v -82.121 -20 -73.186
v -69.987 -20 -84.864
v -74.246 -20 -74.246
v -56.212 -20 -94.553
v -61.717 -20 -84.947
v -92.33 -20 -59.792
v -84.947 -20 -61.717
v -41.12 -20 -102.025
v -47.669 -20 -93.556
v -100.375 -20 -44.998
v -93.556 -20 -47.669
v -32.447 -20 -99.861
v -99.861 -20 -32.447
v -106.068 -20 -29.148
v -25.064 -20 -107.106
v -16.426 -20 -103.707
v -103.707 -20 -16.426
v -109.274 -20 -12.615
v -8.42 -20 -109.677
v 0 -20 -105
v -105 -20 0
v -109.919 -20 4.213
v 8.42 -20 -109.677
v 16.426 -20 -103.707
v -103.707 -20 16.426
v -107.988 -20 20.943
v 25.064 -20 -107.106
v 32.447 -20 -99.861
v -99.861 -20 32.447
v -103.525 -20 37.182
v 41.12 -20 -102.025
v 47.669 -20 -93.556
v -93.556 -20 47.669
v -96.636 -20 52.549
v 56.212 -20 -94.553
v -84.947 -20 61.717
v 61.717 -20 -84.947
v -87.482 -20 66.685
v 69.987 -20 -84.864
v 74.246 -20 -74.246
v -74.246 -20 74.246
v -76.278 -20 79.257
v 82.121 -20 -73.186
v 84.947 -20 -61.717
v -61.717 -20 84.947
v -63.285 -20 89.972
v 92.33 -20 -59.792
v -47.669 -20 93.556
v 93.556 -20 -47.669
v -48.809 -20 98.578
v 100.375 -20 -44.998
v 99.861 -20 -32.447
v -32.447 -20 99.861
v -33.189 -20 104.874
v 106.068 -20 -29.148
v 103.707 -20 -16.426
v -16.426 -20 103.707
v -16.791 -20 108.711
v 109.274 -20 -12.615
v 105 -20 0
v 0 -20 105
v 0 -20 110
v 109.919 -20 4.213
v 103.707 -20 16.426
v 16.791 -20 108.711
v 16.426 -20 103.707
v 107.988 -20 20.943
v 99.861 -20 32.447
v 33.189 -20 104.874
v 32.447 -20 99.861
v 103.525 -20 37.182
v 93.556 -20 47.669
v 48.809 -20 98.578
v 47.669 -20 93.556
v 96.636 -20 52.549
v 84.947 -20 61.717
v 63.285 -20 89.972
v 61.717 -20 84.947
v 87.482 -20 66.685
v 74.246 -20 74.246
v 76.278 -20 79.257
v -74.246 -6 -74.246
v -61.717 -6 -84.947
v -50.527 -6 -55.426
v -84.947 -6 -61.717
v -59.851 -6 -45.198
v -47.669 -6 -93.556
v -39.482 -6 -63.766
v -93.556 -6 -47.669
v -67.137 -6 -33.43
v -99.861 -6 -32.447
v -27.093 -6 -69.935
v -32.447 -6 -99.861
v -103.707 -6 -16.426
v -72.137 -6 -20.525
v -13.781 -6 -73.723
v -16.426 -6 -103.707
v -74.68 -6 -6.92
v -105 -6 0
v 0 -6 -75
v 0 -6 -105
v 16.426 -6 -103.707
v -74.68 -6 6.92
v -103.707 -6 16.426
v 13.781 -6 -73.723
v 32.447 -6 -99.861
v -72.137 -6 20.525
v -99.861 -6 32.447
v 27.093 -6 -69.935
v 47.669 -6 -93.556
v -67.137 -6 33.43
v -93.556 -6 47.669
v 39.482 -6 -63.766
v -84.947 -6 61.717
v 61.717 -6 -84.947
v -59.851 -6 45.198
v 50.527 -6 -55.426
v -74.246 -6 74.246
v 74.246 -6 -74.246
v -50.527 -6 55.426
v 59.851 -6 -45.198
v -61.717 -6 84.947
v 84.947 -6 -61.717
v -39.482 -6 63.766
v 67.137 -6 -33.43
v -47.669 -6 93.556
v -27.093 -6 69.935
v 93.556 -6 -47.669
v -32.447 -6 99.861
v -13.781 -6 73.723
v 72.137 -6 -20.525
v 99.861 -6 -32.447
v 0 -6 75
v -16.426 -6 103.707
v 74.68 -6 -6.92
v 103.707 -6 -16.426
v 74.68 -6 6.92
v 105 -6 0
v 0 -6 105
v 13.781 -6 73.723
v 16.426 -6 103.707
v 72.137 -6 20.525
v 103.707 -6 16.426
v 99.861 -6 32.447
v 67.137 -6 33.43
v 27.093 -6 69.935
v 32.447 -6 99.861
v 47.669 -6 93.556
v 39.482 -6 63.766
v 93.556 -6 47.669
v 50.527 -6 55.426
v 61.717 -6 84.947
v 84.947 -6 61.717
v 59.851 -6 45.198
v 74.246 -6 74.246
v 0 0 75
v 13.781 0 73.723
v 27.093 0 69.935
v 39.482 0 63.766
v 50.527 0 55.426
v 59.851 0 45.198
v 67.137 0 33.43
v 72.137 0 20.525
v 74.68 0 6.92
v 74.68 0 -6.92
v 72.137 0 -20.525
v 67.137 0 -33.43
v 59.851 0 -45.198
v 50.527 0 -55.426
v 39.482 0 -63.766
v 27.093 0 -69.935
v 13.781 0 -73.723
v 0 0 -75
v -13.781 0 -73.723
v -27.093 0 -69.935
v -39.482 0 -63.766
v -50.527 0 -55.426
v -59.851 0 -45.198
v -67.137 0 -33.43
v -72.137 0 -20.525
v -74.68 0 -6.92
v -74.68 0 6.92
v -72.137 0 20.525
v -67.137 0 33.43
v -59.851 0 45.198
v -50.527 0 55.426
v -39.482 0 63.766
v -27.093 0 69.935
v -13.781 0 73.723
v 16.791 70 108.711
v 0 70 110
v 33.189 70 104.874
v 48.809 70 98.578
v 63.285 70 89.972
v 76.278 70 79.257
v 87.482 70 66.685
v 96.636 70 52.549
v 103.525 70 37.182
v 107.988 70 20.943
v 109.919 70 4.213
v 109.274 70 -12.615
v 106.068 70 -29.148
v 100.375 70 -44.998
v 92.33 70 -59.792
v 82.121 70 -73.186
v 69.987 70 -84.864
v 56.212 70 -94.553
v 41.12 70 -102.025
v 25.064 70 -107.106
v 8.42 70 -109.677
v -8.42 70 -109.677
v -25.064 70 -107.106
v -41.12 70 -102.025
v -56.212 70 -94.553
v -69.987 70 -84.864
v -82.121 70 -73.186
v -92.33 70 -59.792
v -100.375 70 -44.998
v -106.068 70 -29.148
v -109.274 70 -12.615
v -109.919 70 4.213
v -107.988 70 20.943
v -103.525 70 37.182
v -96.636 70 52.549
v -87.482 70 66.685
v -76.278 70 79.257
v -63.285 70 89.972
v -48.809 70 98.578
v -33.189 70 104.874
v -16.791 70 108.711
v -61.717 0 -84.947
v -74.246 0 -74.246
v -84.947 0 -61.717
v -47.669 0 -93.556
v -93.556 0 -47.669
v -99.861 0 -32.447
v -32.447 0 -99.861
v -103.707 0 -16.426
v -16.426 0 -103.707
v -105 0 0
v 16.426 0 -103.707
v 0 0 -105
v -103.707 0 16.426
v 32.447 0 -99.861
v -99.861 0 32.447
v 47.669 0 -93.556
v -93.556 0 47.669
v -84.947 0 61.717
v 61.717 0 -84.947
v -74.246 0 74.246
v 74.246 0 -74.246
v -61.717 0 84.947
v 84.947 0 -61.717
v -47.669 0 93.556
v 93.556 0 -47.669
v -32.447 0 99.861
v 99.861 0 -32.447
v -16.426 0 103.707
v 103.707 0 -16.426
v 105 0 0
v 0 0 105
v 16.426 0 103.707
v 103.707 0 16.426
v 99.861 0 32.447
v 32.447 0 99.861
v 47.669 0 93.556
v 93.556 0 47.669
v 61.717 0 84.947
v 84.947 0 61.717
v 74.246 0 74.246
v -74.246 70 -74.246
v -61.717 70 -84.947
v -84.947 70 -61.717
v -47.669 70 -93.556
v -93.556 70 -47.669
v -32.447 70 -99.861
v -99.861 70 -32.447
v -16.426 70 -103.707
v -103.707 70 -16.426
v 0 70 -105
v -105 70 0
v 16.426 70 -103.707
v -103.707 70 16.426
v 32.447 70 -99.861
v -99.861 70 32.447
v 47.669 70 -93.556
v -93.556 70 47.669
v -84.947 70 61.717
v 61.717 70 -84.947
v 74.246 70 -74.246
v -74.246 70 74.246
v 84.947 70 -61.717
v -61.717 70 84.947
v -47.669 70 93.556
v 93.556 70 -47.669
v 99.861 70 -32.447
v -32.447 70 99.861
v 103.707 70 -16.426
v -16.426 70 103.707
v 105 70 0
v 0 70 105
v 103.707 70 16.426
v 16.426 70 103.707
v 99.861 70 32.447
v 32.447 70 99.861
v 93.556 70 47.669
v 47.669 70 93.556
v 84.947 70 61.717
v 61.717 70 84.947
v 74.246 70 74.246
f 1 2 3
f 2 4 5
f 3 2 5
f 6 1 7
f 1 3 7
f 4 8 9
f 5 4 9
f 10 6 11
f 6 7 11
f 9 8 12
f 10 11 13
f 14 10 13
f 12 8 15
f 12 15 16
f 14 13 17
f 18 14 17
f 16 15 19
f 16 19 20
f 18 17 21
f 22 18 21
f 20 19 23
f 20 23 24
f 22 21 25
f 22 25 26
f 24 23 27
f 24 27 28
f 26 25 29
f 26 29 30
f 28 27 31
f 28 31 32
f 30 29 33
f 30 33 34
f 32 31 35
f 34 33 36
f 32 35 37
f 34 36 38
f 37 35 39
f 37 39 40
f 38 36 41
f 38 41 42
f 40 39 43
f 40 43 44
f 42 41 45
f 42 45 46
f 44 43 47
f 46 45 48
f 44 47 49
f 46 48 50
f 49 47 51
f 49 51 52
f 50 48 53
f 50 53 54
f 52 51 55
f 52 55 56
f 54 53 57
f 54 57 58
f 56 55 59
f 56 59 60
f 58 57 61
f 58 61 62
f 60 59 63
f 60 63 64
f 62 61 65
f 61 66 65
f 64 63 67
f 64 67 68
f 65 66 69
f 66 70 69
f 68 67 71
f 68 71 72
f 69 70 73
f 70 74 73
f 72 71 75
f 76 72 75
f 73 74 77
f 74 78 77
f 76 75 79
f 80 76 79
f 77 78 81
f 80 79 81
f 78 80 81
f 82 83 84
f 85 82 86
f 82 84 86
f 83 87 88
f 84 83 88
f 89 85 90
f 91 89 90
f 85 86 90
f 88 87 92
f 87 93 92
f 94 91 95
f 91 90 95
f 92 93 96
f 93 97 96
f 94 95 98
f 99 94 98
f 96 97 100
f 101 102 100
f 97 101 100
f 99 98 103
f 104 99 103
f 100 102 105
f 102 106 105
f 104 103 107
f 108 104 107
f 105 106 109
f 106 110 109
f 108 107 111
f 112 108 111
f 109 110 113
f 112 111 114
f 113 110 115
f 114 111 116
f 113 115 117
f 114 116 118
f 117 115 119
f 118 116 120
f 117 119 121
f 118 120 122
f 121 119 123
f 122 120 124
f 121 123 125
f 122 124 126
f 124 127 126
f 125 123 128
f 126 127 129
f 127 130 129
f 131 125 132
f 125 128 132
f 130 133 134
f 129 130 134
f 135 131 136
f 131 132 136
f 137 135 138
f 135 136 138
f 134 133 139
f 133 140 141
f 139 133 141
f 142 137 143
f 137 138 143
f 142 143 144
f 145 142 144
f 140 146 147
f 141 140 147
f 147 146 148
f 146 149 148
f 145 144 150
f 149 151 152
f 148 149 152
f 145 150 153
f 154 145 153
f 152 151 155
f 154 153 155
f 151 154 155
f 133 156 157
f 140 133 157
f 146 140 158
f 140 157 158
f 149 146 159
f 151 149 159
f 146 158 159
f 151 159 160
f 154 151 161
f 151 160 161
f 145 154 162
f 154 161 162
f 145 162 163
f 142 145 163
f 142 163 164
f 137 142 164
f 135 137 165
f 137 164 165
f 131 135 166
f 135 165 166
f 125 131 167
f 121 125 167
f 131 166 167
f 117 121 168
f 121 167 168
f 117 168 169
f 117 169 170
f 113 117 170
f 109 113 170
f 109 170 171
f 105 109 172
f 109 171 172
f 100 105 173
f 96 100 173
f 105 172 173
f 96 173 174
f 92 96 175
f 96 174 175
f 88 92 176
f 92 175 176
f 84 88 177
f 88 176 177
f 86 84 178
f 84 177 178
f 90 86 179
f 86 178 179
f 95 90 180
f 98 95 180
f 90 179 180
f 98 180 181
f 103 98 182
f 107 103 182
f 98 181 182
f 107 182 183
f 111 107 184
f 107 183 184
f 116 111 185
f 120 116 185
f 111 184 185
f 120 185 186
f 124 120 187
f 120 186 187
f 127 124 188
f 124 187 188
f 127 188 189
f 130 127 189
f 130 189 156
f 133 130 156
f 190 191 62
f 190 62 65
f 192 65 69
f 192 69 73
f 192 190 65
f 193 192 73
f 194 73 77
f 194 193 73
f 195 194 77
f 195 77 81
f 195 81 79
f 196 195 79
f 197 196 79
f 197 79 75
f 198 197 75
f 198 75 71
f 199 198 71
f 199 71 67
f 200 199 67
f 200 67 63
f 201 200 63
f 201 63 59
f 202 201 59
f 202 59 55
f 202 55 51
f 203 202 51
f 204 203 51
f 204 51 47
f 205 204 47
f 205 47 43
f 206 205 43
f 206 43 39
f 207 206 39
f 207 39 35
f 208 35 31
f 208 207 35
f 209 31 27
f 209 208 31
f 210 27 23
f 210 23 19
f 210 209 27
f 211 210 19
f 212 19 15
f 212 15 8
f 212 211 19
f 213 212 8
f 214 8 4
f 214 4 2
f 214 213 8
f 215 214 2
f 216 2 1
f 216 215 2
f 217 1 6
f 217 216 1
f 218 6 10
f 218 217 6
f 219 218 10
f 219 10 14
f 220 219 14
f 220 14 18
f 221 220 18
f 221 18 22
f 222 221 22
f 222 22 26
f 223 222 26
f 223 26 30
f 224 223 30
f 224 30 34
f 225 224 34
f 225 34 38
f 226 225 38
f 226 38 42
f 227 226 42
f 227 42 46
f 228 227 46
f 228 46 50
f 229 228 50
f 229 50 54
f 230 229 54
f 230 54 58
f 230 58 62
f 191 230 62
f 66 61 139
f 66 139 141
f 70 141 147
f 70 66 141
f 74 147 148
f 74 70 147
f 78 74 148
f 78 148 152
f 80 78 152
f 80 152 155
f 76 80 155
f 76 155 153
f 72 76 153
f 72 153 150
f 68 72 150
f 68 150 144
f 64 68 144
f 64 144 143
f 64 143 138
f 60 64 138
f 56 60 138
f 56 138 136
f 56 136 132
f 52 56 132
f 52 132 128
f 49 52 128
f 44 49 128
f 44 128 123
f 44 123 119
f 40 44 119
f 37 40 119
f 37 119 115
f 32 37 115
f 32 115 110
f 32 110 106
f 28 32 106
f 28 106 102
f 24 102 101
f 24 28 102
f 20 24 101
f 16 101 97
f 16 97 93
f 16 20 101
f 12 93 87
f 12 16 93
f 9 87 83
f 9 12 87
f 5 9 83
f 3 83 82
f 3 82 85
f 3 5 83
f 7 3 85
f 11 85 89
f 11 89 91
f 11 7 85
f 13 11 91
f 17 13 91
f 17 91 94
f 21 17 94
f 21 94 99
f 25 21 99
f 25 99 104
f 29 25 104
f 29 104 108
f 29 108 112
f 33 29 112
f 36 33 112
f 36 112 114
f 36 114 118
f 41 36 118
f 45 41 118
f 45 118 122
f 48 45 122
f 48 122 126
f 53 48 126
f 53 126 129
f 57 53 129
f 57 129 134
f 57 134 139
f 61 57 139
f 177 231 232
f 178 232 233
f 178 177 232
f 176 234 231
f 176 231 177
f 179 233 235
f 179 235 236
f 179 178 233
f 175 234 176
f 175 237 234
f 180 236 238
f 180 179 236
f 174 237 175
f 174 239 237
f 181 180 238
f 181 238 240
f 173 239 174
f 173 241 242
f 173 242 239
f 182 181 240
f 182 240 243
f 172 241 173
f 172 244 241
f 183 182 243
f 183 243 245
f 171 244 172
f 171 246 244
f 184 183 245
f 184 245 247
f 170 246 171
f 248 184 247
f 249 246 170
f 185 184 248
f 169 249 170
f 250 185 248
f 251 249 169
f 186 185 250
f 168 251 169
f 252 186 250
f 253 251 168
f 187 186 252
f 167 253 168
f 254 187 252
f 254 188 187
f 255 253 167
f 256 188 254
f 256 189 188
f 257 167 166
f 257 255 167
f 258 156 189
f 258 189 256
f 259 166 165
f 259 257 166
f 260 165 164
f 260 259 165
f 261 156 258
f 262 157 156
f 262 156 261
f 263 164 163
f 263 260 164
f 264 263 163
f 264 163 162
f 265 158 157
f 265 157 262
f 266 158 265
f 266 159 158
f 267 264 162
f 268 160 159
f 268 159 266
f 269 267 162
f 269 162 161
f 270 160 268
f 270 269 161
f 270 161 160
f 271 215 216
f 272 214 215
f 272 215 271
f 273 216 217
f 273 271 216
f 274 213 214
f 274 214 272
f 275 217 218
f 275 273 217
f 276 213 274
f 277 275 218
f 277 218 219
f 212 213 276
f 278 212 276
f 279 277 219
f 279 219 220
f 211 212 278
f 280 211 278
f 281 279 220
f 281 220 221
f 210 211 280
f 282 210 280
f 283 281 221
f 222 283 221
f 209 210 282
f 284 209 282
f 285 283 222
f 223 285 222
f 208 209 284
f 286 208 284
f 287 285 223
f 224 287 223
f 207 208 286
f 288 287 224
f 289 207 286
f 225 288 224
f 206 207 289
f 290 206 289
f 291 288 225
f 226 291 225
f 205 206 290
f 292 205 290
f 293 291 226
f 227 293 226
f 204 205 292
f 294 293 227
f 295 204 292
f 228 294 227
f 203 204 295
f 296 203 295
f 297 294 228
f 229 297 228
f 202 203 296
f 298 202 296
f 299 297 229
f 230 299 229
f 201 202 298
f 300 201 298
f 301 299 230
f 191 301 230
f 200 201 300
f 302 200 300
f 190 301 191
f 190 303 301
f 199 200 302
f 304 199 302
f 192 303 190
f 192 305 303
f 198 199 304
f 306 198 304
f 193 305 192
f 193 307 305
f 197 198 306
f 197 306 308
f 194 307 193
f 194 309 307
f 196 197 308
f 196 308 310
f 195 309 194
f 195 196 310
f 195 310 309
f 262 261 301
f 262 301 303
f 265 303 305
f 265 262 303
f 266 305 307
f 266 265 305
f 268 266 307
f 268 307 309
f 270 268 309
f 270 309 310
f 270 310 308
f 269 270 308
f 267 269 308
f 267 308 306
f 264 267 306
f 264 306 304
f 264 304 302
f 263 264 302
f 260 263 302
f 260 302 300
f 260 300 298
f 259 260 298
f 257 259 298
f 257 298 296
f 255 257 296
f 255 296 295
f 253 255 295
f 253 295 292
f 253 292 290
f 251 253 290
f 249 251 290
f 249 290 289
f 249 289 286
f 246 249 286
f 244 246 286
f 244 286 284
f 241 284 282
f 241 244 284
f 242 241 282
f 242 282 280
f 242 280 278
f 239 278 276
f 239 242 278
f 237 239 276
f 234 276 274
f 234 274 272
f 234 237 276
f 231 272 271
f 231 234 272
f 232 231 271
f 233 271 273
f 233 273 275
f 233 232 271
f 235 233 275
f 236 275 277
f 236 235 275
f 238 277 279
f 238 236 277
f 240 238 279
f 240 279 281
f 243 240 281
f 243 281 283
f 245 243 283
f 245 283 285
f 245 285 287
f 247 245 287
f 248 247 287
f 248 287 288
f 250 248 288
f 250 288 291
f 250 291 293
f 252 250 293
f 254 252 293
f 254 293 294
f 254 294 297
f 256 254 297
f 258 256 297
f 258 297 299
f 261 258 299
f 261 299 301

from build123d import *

# Parameters (mm, degrees)
BOSS_EXTRUDE1_DEPTH      = 70
BOSS_EXTRUDE1_DEPTH_BACK = 20
SKETCH1_R                = 120
SKETCH1_R_2              = 105
SKETCH2_R                = 105
SKETCH2_R_2              = 75
BOSS_EXTRUDE2_DEPTH      = 6
SKETCH3_R                = 120
SKETCH3_R_2              = 115
CUT_EXTRUDE1_DEPTH       = 193.093727123
SKETCH4_R                = 120
SKETCH4_R_2              = 110
CUT_EXTRUDE2_DEPTH       = 186.876302954


with BuildPart() as part:
    # Sketch1 → Boss-Extrude1 (new, two sides: drawn at the far end of the back side and taken through both)
    with BuildSketch(Plane(origin=(0, 0, 0), x_dir=(1, 0, 0), z_dir=(0, 1, 0)).offset(-BOSS_EXTRUDE1_DEPTH_BACK)):
        with Locations(Location((0, 0, 0), (0, 0, 270))):
            Circle(SKETCH1_R)
        with Locations(Location((0, 0, 0), (0, 0, 270))):
            Circle(SKETCH1_R_2, mode=Mode.SUBTRACT)
    extrude(amount=BOSS_EXTRUDE1_DEPTH + BOSS_EXTRUDE1_DEPTH_BACK)

    # Sketch2 → Boss-Extrude2 (add)
    with BuildSketch(Plane(origin=(0, 0, 0), x_dir=(1, 0, 0), z_dir=(0, 1, 0))):
        with Locations(Location((0, 0, 0), (0, 0, 270))):
            Circle(SKETCH2_R)
        with Locations(Location((0, 0, 0), (0, 0, 270))):
            Circle(SKETCH2_R_2, mode=Mode.SUBTRACT)
    extrude(amount=-BOSS_EXTRUDE2_DEPTH)

    # Sketch3 → Cut-Extrude1 (cut, through all)
    with BuildSketch(Plane(origin=(0, 70, 0), x_dir=(1, 0, 0), z_dir=(0, 1, 0))):
        Circle(SKETCH3_R)
        with Locations(Location((0, 0, 0), (0, 0, 270))):
            Circle(SKETCH3_R_2, mode=Mode.SUBTRACT)
    extrude(amount=-CUT_EXTRUDE1_DEPTH, mode=Mode.SUBTRACT)

    # Sketch4 → Cut-Extrude2 (cut, through all)
    with BuildSketch(Plane(origin=(0, 70, 0), x_dir=(1, 0, 0), z_dir=(0, 1, 0))):
        Circle(SKETCH4_R)
        with Locations(Location((0, 0, 0), (0, 0, 270))):
            Circle(SKETCH4_R_2, mode=Mode.SUBTRACT)
    extrude(amount=-CUT_EXTRUDE2_DEPTH, mode=Mode.SUBTRACT)


solid = part.part
